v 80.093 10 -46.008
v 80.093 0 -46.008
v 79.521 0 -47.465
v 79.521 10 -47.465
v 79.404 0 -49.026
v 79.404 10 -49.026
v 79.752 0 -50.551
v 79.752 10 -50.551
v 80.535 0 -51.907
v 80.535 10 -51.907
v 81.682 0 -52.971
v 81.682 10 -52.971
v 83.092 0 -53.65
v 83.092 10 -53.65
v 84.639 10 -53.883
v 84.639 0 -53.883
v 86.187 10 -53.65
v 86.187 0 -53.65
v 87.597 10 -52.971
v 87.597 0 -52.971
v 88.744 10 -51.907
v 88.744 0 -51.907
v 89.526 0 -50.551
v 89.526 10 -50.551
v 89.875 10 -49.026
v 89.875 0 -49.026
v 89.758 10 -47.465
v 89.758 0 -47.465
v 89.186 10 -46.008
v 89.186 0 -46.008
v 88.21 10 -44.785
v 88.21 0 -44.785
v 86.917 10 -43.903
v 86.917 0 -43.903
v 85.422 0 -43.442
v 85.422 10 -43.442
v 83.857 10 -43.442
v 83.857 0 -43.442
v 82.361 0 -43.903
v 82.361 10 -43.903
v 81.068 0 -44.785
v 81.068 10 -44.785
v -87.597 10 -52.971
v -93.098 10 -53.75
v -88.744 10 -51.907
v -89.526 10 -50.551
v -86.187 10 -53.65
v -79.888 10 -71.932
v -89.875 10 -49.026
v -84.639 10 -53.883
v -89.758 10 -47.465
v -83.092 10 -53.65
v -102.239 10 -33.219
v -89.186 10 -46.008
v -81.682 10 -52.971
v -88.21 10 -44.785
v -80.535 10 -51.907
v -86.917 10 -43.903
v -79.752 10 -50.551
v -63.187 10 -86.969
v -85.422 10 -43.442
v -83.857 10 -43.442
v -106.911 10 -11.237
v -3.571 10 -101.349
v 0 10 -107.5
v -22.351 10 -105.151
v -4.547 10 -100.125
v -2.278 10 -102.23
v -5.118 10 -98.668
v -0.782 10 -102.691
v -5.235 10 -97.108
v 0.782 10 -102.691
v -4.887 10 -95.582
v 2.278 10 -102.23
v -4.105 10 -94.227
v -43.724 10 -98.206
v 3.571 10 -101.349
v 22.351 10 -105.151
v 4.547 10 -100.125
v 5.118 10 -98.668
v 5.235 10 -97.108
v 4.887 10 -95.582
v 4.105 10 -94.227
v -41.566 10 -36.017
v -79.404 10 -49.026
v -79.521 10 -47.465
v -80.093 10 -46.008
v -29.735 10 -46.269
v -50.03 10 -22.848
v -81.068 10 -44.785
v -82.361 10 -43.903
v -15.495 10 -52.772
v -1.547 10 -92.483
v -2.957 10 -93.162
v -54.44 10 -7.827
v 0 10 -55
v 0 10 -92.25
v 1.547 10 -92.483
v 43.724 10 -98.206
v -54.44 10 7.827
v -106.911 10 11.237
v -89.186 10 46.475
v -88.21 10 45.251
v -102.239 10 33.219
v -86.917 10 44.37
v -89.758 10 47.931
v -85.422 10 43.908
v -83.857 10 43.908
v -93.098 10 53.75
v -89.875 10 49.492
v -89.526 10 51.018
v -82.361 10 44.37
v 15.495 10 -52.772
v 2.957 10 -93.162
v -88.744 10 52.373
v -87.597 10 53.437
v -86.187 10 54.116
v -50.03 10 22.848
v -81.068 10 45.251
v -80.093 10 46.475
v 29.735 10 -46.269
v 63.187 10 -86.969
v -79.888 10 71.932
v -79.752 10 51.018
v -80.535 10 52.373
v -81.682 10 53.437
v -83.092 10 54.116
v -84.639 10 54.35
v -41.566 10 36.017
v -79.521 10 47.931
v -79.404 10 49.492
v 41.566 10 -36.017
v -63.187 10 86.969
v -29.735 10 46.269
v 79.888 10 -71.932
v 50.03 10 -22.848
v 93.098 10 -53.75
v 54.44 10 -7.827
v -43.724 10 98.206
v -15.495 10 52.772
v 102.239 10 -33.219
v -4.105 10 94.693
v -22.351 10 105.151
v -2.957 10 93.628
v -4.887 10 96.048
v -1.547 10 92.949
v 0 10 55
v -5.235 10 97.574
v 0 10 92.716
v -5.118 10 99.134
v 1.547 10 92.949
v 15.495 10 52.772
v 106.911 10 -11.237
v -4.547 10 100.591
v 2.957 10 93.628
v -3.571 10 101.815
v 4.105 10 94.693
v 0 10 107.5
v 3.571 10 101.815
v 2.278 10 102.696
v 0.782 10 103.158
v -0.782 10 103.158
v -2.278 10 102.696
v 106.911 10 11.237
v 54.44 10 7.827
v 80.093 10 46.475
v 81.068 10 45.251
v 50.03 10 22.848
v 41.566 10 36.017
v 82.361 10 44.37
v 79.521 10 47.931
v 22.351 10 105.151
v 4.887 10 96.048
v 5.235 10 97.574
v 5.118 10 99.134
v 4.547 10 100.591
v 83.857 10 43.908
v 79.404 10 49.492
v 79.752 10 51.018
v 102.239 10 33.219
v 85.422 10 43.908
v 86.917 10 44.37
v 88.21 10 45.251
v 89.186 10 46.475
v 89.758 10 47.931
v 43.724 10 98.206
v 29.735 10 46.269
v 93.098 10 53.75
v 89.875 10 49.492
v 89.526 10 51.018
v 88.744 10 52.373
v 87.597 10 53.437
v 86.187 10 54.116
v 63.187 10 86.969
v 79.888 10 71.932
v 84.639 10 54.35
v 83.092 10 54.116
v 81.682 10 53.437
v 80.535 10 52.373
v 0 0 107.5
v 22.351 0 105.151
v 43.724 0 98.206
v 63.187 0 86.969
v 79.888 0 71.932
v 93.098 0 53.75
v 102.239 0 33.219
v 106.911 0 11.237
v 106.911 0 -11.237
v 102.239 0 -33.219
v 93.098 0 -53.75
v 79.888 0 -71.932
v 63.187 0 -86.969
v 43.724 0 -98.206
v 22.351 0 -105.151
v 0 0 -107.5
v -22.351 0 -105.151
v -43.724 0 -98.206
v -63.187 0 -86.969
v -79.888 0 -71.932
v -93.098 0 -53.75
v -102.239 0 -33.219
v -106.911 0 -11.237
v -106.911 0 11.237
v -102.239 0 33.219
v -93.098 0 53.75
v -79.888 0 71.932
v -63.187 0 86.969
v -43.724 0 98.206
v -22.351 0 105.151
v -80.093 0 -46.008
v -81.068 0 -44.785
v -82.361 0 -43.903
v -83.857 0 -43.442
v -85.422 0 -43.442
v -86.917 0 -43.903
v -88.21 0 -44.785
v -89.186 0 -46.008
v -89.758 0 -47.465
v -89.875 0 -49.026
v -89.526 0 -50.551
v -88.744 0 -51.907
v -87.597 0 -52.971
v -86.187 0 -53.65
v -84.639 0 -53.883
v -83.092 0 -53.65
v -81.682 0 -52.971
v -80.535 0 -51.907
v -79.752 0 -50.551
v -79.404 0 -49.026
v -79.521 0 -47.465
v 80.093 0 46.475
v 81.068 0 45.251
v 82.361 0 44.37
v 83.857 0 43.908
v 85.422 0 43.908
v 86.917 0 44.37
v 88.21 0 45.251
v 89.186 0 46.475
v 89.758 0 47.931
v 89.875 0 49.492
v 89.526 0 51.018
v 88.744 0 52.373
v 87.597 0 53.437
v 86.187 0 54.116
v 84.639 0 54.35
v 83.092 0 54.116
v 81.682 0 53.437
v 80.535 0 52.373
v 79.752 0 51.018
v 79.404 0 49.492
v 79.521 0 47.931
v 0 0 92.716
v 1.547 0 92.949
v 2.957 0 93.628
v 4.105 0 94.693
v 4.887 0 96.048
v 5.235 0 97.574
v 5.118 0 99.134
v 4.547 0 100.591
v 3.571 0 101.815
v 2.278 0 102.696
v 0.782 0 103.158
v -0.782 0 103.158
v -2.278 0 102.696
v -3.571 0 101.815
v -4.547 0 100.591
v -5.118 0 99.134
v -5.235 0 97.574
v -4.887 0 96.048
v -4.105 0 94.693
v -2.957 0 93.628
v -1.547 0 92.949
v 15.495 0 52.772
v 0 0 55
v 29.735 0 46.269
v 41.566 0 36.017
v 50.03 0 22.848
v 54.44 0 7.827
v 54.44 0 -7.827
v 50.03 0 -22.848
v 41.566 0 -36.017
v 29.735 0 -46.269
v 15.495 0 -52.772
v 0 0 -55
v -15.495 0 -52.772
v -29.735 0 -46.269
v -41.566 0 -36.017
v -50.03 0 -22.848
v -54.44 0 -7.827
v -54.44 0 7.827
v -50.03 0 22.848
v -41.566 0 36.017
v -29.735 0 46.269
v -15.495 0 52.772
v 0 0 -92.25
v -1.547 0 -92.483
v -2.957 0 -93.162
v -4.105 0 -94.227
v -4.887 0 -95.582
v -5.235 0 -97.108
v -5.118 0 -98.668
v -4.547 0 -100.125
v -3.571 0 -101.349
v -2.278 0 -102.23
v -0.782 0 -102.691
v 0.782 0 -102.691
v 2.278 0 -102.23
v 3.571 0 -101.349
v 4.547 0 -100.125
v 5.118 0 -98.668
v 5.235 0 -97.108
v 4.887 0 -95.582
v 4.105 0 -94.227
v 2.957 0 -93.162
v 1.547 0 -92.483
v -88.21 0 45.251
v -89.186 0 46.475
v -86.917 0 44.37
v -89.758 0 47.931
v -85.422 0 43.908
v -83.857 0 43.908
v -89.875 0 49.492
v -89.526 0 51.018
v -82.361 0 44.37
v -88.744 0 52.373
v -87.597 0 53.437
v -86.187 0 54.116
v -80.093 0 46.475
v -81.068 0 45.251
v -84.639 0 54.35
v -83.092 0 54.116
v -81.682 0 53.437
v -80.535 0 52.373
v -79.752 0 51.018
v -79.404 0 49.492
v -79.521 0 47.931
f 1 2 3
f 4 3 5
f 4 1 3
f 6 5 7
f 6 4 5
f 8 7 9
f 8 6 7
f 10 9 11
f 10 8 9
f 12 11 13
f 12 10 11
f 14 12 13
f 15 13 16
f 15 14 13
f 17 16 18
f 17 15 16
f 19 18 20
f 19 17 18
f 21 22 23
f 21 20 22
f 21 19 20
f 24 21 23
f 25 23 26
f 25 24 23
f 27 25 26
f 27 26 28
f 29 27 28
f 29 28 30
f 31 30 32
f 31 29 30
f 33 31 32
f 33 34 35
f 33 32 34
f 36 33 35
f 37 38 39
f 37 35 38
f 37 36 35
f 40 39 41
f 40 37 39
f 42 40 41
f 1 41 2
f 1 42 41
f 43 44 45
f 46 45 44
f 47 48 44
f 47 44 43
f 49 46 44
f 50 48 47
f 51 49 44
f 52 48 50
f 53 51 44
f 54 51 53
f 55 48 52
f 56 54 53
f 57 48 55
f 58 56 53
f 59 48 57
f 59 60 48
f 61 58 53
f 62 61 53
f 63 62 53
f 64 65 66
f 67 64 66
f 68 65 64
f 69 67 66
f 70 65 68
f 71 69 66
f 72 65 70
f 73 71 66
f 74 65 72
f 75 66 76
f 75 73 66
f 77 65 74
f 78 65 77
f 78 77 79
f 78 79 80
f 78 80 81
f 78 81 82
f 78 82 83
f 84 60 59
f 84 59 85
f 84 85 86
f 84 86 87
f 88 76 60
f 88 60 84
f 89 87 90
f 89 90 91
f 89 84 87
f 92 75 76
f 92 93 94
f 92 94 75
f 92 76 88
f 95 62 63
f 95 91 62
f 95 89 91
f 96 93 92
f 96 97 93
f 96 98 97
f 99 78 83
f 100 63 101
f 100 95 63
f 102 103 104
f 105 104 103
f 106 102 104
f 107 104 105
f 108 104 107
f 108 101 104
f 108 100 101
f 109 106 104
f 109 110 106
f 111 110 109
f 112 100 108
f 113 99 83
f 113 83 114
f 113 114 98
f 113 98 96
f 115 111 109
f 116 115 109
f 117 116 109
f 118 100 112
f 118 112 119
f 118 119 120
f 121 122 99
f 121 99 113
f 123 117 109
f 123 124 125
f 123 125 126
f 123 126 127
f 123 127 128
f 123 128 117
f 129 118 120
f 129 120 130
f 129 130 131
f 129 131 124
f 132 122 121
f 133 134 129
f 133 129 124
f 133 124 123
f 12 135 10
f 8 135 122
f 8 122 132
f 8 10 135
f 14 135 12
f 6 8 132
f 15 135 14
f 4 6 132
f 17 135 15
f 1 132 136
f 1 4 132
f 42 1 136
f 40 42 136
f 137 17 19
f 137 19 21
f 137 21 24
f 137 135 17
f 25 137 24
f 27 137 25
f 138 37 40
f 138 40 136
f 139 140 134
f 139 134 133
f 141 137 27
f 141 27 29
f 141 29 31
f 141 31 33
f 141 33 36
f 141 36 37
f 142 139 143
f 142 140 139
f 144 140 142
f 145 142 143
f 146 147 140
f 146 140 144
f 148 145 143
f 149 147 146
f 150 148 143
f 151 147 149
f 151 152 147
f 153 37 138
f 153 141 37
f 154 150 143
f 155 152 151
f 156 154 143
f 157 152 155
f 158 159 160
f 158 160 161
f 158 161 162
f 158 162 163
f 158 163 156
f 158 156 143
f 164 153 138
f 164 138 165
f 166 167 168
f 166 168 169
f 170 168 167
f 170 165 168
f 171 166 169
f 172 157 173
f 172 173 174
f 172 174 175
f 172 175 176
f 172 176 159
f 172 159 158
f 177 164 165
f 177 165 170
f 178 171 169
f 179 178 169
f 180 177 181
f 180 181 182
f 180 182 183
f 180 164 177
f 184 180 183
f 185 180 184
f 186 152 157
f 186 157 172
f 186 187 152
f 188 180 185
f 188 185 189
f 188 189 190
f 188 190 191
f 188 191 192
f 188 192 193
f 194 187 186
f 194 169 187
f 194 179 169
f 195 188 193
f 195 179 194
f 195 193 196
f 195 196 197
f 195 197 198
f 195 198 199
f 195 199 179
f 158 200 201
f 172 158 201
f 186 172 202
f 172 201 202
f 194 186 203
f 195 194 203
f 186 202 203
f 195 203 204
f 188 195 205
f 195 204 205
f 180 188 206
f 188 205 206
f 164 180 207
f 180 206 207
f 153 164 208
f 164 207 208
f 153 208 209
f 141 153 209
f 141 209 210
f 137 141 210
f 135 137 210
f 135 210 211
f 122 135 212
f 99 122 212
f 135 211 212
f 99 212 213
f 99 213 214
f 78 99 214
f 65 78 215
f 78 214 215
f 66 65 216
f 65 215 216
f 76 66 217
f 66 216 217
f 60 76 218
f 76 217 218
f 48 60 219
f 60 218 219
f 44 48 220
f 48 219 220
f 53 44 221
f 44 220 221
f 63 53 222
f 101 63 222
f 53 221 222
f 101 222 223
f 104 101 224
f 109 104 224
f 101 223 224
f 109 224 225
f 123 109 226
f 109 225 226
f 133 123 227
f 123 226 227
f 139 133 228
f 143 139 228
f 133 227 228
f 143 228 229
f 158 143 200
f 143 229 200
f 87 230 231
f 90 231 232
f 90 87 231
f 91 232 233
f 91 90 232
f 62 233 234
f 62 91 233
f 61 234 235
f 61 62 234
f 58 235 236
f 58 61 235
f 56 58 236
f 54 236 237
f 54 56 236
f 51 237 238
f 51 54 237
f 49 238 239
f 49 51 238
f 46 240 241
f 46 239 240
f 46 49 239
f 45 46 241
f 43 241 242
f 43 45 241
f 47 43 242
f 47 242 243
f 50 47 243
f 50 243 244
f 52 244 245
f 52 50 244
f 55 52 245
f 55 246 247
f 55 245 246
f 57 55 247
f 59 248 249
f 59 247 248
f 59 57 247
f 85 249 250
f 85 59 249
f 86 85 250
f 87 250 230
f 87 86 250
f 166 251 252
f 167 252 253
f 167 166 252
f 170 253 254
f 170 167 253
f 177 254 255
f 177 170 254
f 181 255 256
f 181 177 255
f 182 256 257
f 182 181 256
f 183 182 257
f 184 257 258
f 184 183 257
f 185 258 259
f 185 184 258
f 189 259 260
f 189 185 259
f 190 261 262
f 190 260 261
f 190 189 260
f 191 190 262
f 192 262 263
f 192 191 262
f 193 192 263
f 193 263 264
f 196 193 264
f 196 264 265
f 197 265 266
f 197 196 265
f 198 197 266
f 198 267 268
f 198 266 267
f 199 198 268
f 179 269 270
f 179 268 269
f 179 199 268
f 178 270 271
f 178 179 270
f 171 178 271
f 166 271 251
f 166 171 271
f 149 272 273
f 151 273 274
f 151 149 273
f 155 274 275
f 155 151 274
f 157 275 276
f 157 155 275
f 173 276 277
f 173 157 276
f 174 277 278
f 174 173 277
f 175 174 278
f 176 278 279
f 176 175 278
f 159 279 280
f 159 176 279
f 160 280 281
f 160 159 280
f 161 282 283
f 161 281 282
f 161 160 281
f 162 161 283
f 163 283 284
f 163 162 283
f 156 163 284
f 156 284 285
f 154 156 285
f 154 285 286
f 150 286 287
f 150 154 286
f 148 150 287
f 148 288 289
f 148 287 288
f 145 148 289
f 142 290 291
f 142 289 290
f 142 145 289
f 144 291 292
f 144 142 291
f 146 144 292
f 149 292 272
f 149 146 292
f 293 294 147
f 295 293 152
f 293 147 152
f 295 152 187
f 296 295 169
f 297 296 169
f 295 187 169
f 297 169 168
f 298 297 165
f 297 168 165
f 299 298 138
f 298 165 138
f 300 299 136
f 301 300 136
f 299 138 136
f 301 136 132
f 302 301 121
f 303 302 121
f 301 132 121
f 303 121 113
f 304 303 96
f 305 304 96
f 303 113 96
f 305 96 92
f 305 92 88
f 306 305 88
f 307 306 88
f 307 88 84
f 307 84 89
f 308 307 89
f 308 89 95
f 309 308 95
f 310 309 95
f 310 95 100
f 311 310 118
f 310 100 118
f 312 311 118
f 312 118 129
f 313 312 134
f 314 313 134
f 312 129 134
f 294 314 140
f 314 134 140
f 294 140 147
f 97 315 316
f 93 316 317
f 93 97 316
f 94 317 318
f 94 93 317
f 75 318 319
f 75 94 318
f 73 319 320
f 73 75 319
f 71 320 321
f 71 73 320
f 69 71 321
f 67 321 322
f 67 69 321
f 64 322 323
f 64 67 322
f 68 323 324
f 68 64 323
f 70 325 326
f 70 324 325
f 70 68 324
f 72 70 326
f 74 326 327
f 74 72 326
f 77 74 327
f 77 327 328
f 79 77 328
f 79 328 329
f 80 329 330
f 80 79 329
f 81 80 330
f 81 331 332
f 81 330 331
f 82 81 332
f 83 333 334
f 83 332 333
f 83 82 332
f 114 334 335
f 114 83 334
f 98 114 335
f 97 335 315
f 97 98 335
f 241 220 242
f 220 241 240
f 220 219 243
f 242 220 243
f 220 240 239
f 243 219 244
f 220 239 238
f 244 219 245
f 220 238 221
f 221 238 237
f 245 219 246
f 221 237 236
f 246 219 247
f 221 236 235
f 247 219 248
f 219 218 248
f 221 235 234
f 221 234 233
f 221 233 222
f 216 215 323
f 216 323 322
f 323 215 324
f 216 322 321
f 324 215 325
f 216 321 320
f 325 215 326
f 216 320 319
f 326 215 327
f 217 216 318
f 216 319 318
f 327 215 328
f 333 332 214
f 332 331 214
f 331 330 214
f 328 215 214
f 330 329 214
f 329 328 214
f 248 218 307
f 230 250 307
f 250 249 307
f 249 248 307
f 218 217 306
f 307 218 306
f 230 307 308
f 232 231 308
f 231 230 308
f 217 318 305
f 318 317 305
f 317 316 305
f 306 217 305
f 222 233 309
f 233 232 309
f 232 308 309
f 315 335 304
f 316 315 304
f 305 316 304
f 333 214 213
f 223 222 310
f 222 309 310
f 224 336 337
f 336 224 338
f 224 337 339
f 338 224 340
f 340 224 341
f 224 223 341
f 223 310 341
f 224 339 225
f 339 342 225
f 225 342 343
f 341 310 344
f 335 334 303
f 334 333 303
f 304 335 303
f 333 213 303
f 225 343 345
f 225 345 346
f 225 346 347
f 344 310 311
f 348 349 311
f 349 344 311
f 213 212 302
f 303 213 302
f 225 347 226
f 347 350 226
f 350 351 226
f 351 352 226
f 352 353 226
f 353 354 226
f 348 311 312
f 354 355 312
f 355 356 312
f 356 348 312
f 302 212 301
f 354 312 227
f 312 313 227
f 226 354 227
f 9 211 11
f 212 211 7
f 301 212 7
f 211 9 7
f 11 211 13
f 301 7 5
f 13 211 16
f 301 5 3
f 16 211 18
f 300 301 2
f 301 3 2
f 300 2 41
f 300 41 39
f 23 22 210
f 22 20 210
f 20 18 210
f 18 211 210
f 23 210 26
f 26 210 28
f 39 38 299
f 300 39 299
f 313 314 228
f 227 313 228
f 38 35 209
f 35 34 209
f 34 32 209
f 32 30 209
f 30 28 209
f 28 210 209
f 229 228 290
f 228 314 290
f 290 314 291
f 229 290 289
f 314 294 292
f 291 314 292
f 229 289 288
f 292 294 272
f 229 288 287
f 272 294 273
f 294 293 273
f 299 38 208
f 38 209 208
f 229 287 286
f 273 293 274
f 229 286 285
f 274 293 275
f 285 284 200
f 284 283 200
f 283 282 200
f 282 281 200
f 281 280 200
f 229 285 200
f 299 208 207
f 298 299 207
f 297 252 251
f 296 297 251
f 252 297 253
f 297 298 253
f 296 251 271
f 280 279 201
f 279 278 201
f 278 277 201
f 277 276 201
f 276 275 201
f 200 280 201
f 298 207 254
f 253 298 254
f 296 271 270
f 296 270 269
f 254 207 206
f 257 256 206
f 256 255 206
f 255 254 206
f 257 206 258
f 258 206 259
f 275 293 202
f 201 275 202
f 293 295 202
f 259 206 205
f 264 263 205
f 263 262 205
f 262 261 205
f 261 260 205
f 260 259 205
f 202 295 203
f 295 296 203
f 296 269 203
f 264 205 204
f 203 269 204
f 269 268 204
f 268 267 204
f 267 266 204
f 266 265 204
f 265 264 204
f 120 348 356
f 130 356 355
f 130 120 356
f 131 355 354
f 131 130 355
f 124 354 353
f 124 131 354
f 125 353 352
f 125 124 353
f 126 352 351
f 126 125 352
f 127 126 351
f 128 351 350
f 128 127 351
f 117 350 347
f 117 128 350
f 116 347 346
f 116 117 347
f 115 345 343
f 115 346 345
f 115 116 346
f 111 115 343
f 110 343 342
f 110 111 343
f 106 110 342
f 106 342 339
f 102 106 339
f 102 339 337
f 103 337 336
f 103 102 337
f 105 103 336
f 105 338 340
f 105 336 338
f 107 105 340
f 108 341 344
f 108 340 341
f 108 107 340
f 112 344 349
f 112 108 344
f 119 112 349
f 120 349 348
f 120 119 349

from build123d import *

# Parameters (mm, degrees)
CROQUIS1_R              = 107.5
SALIENTE_EXTRUIR1_DEPTH = 10
MATRIZC1_COUNT          = 6
CROQUIS4_R              = 55
CORTAR_EXTRUIR1_DEPTH   = 10


with BuildPart() as part:
    # Croquis1 → Saliente-Extruir1 (new body)
    with BuildSketch(Plane(origin=(0, 0, 0), x_dir=(1, 0, 0), z_dir=(0, 1, 0))):
        with Locations(Location((0, 0, 0), (0, 0, 270))):
            Circle(CROQUIS1_R)
    extrude(amount=SALIENTE_EXTRUIR1_DEPTH)

    # Croquis6 → Taladro roscado M12x1.51 (revolve, cut)
    with BuildSketch(Plane(origin=(0, 10, -97.5), x_dir=(0, 0, 1), z_dir=(1, 0, 0))):
        Polygon((0, 0), (0, 34.65451825), (5.25, 31.5), (5.25, 0), align=None)
    taladro_roscado_m12x1_51 = revolve(axis=Axis((0, 16.35, -97.5), (0, -1, 0)), mode=Mode.SUBTRACT)

    # MatrizC1: Taladro roscado M12x1.51 ×6 about axis
    matrizc1_axis = Axis((0, 0, 0.233100581), (0, 1, 0))
    for i in range(1, MATRIZC1_COUNT):
        add(taladro_roscado_m12x1_51.rotate(matrizc1_axis, i * 360 / MATRIZC1_COUNT), mode=Mode.SUBTRACT)

    # Croquis4 → Cortar-Extruir1 (cut)
    with BuildSketch(Plane(origin=(0, 10, 0), x_dir=(1, 0, 0), z_dir=(0, 1, 0))):
        with Locations(Location((0, 0, 0), (0, 0, 270))):
            Circle(CROQUIS4_R)
    extrude(amount=-CORTAR_EXTRUIR1_DEPTH, mode=Mode.SUBTRACT)


solid = part.part
